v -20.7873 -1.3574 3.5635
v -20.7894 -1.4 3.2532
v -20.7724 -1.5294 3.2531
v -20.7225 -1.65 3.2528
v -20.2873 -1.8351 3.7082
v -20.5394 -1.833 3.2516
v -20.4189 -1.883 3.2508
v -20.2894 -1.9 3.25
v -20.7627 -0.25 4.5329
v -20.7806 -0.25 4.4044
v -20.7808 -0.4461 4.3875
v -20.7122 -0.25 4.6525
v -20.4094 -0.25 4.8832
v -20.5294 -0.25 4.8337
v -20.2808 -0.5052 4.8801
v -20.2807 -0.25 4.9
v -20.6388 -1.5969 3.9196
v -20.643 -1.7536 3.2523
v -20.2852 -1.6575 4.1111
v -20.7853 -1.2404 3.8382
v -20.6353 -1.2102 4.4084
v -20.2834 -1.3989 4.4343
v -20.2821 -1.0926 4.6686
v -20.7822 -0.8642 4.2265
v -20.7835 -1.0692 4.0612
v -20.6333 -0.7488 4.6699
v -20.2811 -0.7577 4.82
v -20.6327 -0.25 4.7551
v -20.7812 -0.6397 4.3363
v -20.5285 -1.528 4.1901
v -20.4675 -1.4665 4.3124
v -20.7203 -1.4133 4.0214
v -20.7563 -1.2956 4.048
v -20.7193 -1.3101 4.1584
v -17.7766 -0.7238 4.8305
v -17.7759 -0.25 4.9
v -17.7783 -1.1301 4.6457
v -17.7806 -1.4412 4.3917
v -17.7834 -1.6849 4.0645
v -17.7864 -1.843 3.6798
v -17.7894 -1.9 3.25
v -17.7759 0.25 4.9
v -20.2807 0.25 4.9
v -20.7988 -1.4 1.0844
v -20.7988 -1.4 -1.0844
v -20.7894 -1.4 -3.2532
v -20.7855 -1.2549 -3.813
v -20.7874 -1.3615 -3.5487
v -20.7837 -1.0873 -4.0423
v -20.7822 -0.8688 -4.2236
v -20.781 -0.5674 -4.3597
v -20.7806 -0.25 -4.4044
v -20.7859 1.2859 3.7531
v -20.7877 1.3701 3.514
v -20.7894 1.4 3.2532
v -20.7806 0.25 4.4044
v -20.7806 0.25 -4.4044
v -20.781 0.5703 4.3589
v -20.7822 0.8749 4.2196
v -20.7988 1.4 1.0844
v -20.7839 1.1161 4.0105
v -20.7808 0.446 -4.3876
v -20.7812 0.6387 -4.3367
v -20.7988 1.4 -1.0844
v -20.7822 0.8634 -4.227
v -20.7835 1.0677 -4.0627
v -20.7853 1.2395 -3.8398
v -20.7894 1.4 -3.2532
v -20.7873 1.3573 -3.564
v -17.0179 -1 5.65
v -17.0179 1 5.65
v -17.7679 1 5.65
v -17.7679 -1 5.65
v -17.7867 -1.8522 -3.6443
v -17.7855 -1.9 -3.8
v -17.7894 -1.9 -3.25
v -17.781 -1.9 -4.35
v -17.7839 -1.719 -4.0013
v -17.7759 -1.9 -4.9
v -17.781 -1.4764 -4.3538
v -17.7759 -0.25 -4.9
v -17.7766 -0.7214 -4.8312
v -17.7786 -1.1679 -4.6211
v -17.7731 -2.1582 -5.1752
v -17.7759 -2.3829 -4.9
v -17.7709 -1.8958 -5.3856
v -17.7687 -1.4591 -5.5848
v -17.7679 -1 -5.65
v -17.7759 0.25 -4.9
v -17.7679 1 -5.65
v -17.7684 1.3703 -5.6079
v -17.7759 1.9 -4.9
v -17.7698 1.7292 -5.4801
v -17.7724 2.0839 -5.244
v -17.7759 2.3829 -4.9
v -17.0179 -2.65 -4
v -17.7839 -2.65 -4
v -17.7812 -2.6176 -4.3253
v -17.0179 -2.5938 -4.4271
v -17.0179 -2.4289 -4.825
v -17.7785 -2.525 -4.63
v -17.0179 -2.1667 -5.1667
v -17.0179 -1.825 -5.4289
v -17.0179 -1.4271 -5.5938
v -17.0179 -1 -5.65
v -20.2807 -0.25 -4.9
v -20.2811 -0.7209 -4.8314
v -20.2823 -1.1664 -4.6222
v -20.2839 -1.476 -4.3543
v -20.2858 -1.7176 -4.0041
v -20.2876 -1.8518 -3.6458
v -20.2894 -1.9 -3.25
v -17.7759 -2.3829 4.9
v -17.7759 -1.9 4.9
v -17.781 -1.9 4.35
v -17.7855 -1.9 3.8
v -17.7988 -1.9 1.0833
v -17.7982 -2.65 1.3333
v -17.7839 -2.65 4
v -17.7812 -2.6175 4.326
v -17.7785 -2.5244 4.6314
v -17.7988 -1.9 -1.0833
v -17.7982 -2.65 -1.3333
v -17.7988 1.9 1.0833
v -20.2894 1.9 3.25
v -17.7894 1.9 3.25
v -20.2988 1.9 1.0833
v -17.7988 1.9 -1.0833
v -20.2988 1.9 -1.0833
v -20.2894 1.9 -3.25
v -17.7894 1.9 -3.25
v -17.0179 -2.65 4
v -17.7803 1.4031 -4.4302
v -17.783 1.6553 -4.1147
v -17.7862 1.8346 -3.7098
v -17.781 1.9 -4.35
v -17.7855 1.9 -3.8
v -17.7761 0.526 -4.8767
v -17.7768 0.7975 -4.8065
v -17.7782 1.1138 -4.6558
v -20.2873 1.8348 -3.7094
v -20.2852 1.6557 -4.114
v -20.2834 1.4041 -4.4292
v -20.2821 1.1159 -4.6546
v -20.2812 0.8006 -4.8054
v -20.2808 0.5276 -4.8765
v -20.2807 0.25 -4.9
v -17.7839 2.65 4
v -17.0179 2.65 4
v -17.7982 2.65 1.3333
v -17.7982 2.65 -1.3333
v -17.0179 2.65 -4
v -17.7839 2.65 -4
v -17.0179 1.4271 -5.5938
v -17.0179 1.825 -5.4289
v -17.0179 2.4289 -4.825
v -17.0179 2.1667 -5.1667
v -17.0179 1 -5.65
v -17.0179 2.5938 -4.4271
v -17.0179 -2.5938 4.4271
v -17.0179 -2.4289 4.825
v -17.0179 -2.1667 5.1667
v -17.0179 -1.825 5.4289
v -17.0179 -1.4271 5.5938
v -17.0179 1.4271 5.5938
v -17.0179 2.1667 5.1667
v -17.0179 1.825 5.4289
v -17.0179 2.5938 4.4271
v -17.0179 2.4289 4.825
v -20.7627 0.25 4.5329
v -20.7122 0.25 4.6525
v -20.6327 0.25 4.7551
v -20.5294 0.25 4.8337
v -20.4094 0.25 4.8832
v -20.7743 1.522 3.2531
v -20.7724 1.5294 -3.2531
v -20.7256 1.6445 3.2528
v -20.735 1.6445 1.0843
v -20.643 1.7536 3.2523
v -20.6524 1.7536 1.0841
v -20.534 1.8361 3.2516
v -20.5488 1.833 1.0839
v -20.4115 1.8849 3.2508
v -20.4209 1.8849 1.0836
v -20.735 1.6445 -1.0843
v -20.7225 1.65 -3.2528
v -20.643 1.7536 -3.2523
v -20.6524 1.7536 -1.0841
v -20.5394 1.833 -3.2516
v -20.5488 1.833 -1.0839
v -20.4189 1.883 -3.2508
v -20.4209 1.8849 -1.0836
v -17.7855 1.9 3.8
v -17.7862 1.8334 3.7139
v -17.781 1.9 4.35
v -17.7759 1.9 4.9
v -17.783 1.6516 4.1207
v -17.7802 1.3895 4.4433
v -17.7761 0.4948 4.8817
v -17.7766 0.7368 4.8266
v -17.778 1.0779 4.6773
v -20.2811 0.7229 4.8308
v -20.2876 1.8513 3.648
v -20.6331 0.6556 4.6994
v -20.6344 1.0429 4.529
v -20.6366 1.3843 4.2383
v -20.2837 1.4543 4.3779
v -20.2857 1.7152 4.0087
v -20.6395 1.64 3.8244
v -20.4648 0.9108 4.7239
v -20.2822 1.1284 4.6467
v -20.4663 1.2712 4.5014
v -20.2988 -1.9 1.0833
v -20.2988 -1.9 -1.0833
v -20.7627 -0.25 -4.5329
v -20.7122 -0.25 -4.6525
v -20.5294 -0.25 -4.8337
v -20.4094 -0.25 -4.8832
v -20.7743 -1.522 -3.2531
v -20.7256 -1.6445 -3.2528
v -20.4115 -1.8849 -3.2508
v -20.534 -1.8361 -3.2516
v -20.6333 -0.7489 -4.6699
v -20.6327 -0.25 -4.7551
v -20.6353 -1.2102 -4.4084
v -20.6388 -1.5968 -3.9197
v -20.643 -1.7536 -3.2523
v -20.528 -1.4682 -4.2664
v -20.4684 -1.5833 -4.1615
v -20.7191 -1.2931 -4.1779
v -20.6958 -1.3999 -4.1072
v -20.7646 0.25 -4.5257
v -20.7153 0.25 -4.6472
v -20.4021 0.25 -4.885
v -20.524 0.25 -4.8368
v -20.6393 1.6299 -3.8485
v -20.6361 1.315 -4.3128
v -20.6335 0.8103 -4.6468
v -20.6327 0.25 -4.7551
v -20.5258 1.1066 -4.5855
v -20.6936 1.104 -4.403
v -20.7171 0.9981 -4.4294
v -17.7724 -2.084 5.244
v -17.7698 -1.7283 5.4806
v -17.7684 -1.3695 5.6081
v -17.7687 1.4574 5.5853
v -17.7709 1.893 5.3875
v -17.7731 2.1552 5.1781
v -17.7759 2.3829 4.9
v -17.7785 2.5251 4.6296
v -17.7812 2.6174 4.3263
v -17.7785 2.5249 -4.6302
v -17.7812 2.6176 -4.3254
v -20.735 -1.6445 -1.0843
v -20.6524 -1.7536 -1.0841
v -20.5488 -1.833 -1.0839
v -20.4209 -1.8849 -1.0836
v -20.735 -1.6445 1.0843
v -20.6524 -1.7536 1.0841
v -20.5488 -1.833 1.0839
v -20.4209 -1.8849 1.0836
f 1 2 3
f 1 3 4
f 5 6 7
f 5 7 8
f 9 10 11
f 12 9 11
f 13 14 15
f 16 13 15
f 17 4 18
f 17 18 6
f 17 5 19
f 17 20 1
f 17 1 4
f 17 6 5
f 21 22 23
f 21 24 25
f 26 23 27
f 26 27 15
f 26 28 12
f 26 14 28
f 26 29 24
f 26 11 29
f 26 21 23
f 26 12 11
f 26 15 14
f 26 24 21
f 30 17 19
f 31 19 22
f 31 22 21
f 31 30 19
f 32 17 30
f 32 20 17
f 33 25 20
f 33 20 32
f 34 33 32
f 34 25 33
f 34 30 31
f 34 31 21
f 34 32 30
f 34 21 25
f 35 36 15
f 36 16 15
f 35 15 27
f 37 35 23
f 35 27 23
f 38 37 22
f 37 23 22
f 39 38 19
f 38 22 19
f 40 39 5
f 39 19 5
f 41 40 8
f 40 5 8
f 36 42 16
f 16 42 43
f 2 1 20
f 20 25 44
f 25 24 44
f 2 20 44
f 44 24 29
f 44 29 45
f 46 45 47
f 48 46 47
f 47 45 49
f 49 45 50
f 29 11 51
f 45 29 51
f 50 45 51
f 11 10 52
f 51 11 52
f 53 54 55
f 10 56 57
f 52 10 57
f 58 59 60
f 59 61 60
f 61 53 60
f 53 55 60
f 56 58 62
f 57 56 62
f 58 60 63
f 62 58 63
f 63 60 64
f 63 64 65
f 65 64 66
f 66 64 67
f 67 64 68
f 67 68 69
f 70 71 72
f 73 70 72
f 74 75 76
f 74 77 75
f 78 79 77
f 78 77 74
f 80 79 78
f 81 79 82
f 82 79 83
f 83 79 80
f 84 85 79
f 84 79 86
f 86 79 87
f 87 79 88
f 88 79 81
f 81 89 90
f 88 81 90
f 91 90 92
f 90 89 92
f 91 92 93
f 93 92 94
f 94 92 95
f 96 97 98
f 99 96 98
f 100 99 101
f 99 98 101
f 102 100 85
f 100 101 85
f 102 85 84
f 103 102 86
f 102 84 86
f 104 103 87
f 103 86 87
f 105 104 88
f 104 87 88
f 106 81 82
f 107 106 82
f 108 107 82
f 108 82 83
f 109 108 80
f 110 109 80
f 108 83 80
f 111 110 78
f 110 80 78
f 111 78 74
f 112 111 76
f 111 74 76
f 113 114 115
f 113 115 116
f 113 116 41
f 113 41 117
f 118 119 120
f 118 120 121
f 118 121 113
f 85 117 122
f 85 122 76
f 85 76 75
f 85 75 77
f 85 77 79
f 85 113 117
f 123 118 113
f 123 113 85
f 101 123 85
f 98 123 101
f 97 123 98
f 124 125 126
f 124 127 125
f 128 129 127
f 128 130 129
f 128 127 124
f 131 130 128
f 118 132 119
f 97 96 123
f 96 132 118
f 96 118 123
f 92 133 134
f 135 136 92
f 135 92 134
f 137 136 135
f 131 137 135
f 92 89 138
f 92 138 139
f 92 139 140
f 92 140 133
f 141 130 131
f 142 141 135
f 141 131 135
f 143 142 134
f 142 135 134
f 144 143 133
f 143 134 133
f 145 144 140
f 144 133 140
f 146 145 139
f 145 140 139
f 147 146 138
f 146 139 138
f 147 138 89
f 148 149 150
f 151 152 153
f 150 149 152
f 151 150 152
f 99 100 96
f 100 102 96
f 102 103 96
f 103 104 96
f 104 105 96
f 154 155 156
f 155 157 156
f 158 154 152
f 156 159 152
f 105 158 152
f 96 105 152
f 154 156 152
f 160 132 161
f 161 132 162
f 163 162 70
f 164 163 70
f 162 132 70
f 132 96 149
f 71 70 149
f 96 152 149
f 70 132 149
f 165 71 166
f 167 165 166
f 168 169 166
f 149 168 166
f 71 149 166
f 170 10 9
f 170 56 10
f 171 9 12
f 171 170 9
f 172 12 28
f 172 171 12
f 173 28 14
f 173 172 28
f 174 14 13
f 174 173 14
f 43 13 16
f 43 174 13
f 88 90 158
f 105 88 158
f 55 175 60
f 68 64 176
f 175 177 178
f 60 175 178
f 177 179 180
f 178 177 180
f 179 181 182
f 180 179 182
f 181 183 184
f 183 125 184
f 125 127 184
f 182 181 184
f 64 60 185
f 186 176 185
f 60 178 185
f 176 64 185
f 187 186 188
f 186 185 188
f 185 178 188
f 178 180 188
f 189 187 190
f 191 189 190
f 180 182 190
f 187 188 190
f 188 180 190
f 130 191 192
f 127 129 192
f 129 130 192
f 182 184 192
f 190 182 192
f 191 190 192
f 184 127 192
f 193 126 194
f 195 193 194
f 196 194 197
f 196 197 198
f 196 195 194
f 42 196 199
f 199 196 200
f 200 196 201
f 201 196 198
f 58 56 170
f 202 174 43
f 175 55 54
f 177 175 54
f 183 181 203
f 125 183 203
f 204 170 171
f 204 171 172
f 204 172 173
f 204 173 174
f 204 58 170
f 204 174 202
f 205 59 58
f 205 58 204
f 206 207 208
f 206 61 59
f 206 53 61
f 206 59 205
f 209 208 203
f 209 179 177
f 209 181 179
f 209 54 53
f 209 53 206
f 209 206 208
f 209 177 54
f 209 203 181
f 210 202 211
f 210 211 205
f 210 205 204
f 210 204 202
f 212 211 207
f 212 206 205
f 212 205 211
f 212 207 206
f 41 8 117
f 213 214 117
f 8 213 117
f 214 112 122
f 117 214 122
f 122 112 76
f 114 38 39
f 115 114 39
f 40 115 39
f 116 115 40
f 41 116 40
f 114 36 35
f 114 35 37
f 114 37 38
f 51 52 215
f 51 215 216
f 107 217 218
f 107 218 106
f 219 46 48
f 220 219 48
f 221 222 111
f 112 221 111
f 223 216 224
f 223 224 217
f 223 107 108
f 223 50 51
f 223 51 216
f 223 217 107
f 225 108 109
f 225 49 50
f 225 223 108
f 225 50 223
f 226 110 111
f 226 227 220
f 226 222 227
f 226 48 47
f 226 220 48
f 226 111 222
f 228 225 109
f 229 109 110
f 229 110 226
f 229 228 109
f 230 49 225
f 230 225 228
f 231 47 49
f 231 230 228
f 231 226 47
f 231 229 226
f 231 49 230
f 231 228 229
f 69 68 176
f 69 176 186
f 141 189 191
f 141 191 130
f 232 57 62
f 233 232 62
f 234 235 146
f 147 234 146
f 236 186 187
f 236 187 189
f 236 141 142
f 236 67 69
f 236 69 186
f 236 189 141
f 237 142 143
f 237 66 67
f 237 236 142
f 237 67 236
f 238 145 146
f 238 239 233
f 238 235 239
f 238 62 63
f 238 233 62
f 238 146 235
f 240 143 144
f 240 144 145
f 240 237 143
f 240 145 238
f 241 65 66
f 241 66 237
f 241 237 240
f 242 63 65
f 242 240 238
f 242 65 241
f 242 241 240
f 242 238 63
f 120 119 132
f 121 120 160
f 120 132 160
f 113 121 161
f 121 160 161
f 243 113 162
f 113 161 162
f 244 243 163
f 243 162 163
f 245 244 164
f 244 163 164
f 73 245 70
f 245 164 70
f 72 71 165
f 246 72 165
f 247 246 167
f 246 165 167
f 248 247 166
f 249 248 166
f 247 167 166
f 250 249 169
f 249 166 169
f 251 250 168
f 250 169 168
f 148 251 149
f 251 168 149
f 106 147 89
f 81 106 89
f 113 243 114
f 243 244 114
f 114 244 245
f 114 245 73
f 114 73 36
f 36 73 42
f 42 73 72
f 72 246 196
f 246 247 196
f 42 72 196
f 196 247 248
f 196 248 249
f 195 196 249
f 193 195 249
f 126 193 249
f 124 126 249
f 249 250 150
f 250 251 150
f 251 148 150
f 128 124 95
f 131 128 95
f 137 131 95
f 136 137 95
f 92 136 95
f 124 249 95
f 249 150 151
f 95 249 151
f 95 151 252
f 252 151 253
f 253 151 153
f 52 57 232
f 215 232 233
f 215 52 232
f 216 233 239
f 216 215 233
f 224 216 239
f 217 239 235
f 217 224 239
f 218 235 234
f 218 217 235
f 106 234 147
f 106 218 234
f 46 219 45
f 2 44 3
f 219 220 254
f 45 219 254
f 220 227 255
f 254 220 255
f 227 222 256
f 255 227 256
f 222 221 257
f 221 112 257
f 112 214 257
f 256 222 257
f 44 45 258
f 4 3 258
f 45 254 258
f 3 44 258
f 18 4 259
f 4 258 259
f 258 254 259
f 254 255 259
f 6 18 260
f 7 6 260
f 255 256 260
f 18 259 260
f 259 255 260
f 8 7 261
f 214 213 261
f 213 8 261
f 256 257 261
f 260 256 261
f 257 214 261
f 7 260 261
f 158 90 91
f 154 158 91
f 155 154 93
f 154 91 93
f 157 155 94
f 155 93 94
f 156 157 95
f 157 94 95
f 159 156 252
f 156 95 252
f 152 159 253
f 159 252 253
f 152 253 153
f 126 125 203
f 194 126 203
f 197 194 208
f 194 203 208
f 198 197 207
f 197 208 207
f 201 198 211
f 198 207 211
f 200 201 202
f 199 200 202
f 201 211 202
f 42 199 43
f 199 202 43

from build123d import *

# Parameters (mm, degrees)
BOSS_EXTRUDE1_DEPTH = 2.65
CUT_EXTRUDE2_DEPTH  = 0.75
FILLET3_R           = 1.65
FILLET4_R           = 0.5


with BuildPart() as part:
    # Sketch1 → Boss-Extrude1 (new, symmetric)
    with BuildSketch(Plane(origin=(0, 0, 0), x_dir=(1, 0, 0), z_dir=(0, 1, 0))):
        with BuildLine():
            Line((-20.776037351, 4.9), (-17.775892991, 4.9))
            ThreePointArc((-17.775892991, 4.9), (-17.772061826, 5.275001496), (-17.767948266, 5.65))
            Line((-17.767948266, 5.65), (-17.017899919, 5.65))
            Line((-17.017899919, 5.65), (-17.017899919, -5.65))
            Line((-17.017899919, -5.65), (-17.767948266, -5.65))
            ThreePointArc((-17.767948266, -5.65), (-17.772061826, -5.275001496), (-17.775892991, -4.9))
            Line((-17.775892991, -4.9), (-20.776037351, -4.9))
            ThreePointArc((-20.776037351, -4.9), (-20.8, 0), (-20.776037351, 4.9))
        make_face()
    extrude(amount=BOSS_EXTRUDE1_DEPTH, both=True)

    # Sketch2 → Cut-Extrude2 (cut)
    with BuildSketch(Plane(origin=(0, 2.65, 0), x_dir=(1, 0, 0), z_dir=(0, 1, 0))):
        with BuildLine():
            Line((-17.775892991, 4.9), (-20.776037348, 4.9))
            ThreePointArc((-20.776037348, 4.9), (-20.799999997, 0), (-20.776037348, -4.9))
            Line((-20.776037348, -4.9), (-17.775892991, -4.9))
            ThreePointArc((-17.775892991, -4.9), (-17.8, 0), (-17.775892991, 4.9))
        make_face()
    cut_extrude2 = extrude(amount=-CUT_EXTRUDE2_DEPTH, mode=Mode.SUBTRACT)

    # Mirror1: Cut-Extrude2 across plane
    add(cut_extrude2.mirror(Plane.ZX), mode=Mode.SUBTRACT)

    # Fillet3
    # the kernel refuses this fillet: 1.65 mm, written as the material it takes off along each edge
    with BuildSketch(Plane(origin=(-17.017899919, 2.65, 5.65), x_dir=(0, 0, -1), z_dir=(-1, 0, 0))) as fillet3_piece_1_section:
        with BuildLine():
            CenterArc((FILLET3_R, FILLET3_R), FILLET3_R, 180, 90)
            Line((0, FILLET3_R), (-FILLET3_R * 0.02, FILLET3_R))
            Line((-FILLET3_R * 0.02, FILLET3_R), (-FILLET3_R * 0.02, -FILLET3_R * 0.02))
            Line((-FILLET3_R * 0.02, -FILLET3_R * 0.02), (FILLET3_R, -FILLET3_R * 0.02))
            Line((FILLET3_R, -FILLET3_R * 0.02), (FILLET3_R, 0))
        make_face()
    fillet3_piece_1 = extrude(amount=4.875048347, mode=Mode.PRIVATE)
    fillet3_piece_1 = fillet3_piece_1 & Plane(origin=(480.200000514, 2.277476363, -5e-09), x_dir=(-0.9999356390878598, 0, 0.011345381525254326), z_dir=(0, 1, 0)) * Cylinder(498.000000514, 17, mode=Mode.PRIVATE)
    add(fillet3_piece_1, mode=Mode.SUBTRACT)
    with BuildSketch(Plane(origin=(-21.892948266, 2.65, -5.65), x_dir=(0, -1, 0), z_dir=(1, 0, 0))) as fillet3_piece_2_section:
        with BuildLine():
            CenterArc((FILLET3_R, -FILLET3_R), FILLET3_R, 90, 90)
            Line((0, -FILLET3_R), (-FILLET3_R * 0.02, -FILLET3_R))
            Line((-FILLET3_R * 0.02, -FILLET3_R), (-FILLET3_R * 0.02, FILLET3_R * 0.02))
            Line((-FILLET3_R * 0.02, FILLET3_R * 0.02), (FILLET3_R, FILLET3_R * 0.02))
            Line((FILLET3_R, FILLET3_R * 0.02), (FILLET3_R, 0))
        make_face()
    fillet3_piece_2 = extrude(amount=4.875048347, mode=Mode.PRIVATE)
    fillet3_piece_2 = fillet3_piece_2 & Plane(origin=(480.200000325, 2.277476179, 3e-09), x_dir=(-0.9999515923510308, 0, -0.009839357430136753), z_dir=(0, 1, 0)) * Cylinder(498.000000325, 17, mode=Mode.PRIVATE)
    add(fillet3_piece_2, mode=Mode.SUBTRACT)
    with BuildSketch(Plane(origin=(-24.901037348, 1.9, 4.9), x_dir=(0, 0, -1), z_dir=(1, 0, 0))) as fillet3_piece_3_section:
        with BuildLine():
            CenterArc((FILLET3_R, -FILLET3_R), FILLET3_R, 90, 90)
            Line((0, -FILLET3_R), (-FILLET3_R * 0.02, -FILLET3_R))
            Line((-FILLET3_R * 0.02, -FILLET3_R), (-FILLET3_R * 0.02, FILLET3_R * 0.02))
            Line((-FILLET3_R * 0.02, FILLET3_R * 0.02), (FILLET3_R, FILLET3_R * 0.02))
            Line((FILLET3_R, FILLET3_R * 0.02), (FILLET3_R, 0))
        make_face()
    fillet3_piece_3 = extrude(amount=11.250144357, mode=Mode.PRIVATE)
    fillet3_piece_3 = fillet3_piece_3 & Plane(origin=(480.2, 1.526447117, 0), x_dir=(-0.9999521703614557, 0, 0.009780439121757674), z_dir=(0, 1, 0)) * Cylinder(501, 30, mode=Mode.PRIVATE)
    fillet3_piece_3 = fillet3_piece_3 - Plane(origin=(480.200000004, 1.526447117, 0), x_dir=(-0.9999515923510358, 0, 0.009839357429633357), z_dir=(0, 1, 0)) * Cylinder(498.000000004, 30, mode=Mode.PRIVATE)
    add(fillet3_piece_3, mode=Mode.SUBTRACT)
    with BuildSketch(Plane(origin=(-13.650892991, 1.9, -4.9), x_dir=(0, -1, 0), z_dir=(-1, 0, 0))) as fillet3_piece_4_section:
        with BuildLine():
            CenterArc((FILLET3_R, FILLET3_R), FILLET3_R, 180, 90)
            Line((0, FILLET3_R), (-FILLET3_R * 0.02, FILLET3_R))
            Line((-FILLET3_R * 0.02, FILLET3_R), (-FILLET3_R * 0.02, -FILLET3_R * 0.02))
            Line((-FILLET3_R * 0.02, -FILLET3_R * 0.02), (FILLET3_R, -FILLET3_R * 0.02))
            Line((FILLET3_R, -FILLET3_R * 0.02), (FILLET3_R, 0))
        make_face()
    fillet3_piece_4 = extrude(amount=11.250144357, mode=Mode.PRIVATE)
    fillet3_piece_4 = fillet3_piece_4 & Plane(origin=(480.2, 1.526445495, 0), x_dir=(-0.9999521703614557, 0, 0.009780439121757674), z_dir=(0, 1, 0)) * Cylinder(501, 30, mode=Mode.PRIVATE)
    fillet3_piece_4 = fillet3_piece_4 - Plane(origin=(480.200000325, 1.526445495, 3e-09), x_dir=(-0.9999515923510308, 0, -0.009839357430136753), z_dir=(0, 1, 0)) * Cylinder(498.000000325, 30, mode=Mode.PRIVATE)
    add(fillet3_piece_4, mode=Mode.SUBTRACT)
    with BuildSketch(Plane(origin=(-13.650892991, -1.9, -4.9), x_dir=(0, 1, 0), z_dir=(-1, 0, 0))) as fillet3_piece_5_section:
        with BuildLine():
            CenterArc((FILLET3_R, -FILLET3_R), FILLET3_R, 90, 90)
            Line((0, -FILLET3_R), (-FILLET3_R * 0.02, -FILLET3_R))
            Line((-FILLET3_R * 0.02, -FILLET3_R), (-FILLET3_R * 0.02, FILLET3_R * 0.02))
            Line((-FILLET3_R * 0.02, FILLET3_R * 0.02), (FILLET3_R, FILLET3_R * 0.02))
            Line((FILLET3_R, FILLET3_R * 0.02), (FILLET3_R, 0))
        make_face()
    fillet3_piece_5 = extrude(amount=11.250144357, mode=Mode.PRIVATE)
    fillet3_piece_5 = fillet3_piece_5 & Plane(origin=(480.2, -1.526445495, 0), x_dir=(-0.9999521703614557, 0, 0.009780439121757674), z_dir=(0, 1, 0)) * Cylinder(501, 30, mode=Mode.PRIVATE)
    fillet3_piece_5 = fillet3_piece_5 - Plane(origin=(480.200000325, -1.526445495, 3e-09), x_dir=(-0.9999515923510308, 0, -0.009839357430136753), z_dir=(0, 1, 0)) * Cylinder(498.000000325, 30, mode=Mode.PRIVATE)
    add(fillet3_piece_5, mode=Mode.SUBTRACT)
    with BuildSketch(Plane(origin=(-24.901037348, -1.9, 4.9), x_dir=(0, 0, -1), z_dir=(1, 0, 0))) as fillet3_piece_6_section:
        with BuildLine():
            CenterArc((FILLET3_R, FILLET3_R), FILLET3_R, 180, 90)
            Line((0, FILLET3_R), (-FILLET3_R * 0.02, FILLET3_R))
            Line((-FILLET3_R * 0.02, FILLET3_R), (-FILLET3_R * 0.02, -FILLET3_R * 0.02))
            Line((-FILLET3_R * 0.02, -FILLET3_R * 0.02), (FILLET3_R, -FILLET3_R * 0.02))
            Line((FILLET3_R, -FILLET3_R * 0.02), (FILLET3_R, 0))
        make_face()
    fillet3_piece_6 = extrude(amount=11.250144357, mode=Mode.PRIVATE)
    fillet3_piece_6 = fillet3_piece_6 & Plane(origin=(480.2, -1.526447117, 0), x_dir=(-0.9999521703614557, 0, 0.009780439121757674), z_dir=(0, 1, 0)) * Cylinder(501, 30, mode=Mode.PRIVATE)
    fillet3_piece_6 = fillet3_piece_6 - Plane(origin=(480.200000004, -1.526447117, 0), x_dir=(-0.9999515923510358, 0, 0.009839357429633357), z_dir=(0, -1, 0)) * Cylinder(498.000000004, 30, mode=Mode.PRIVATE)
    add(fillet3_piece_6, mode=Mode.SUBTRACT)
    with BuildSketch(Plane(origin=(-21.892948266, -2.65, -5.65), x_dir=(0, 0, 1), z_dir=(1, 0, 0))) as fillet3_piece_7_section:
        with BuildLine():
            CenterArc((FILLET3_R, -FILLET3_R), FILLET3_R, 90, 90)
            Line((0, -FILLET3_R), (-FILLET3_R * 0.02, -FILLET3_R))
            Line((-FILLET3_R * 0.02, -FILLET3_R), (-FILLET3_R * 0.02, FILLET3_R * 0.02))
            Line((-FILLET3_R * 0.02, FILLET3_R * 0.02), (FILLET3_R, FILLET3_R * 0.02))
            Line((FILLET3_R, FILLET3_R * 0.02), (FILLET3_R, 0))
        make_face()
    fillet3_piece_7 = extrude(amount=4.875048347, mode=Mode.PRIVATE)
    fillet3_piece_7 = fillet3_piece_7 & Plane(origin=(480.200000325, -2.27747614, 3e-09), x_dir=(-0.9999515923510308, 0, -0.009839357430136753), z_dir=(0, 1, 0)) * Cylinder(498.000000325, 17, mode=Mode.PRIVATE)
    add(fillet3_piece_7, mode=Mode.SUBTRACT)
    with BuildSketch(Plane(origin=(-17.017899919, -2.65, 5.65), x_dir=(0, 0, -1), z_dir=(-1, 0, 0))) as fillet3_piece_8_section:
        with BuildLine():
            CenterArc((FILLET3_R, -FILLET3_R), FILLET3_R, 90, 90)
            Line((0, -FILLET3_R), (-FILLET3_R * 0.02, -FILLET3_R))
            Line((-FILLET3_R * 0.02, -FILLET3_R), (-FILLET3_R * 0.02, FILLET3_R * 0.02))
            Line((-FILLET3_R * 0.02, FILLET3_R * 0.02), (FILLET3_R, FILLET3_R * 0.02))
            Line((FILLET3_R, FILLET3_R * 0.02), (FILLET3_R, 0))
        make_face()
    fillet3_piece_8 = extrude(amount=4.875048347, mode=Mode.PRIVATE)
    fillet3_piece_8 = fillet3_piece_8 & Plane(origin=(480.200000514, -2.277476363, -5e-09), x_dir=(-0.9999356390878598, 0, 0.011345381525254326), z_dir=(0, 1, 0)) * Cylinder(498.000000514, 17, mode=Mode.PRIVATE)
    add(fillet3_piece_8, mode=Mode.SUBTRACT)

    # Fillet4
    fillet4_edges = [part.edges().sort_by_distance(p)[0] for p in [
        (-20.776037351, 0, 4.9),
        (-20.799999997, -1.9, 0),
        (-20.799999997, 1.9, 0),
        (-20.776037351, 0, -4.9),
        (-20.780531146, -1.416733553, -4.416718844),
        (-20.780531153, 1.416733542, -4.416718836),
        (-20.780531153, 1.416733544, 4.416718836),
        (-20.780531146, -1.416733553, 4.416718845),
    ]]
    fillet(fillet4_edges, radius=FILLET4_R)


solid = part.part
